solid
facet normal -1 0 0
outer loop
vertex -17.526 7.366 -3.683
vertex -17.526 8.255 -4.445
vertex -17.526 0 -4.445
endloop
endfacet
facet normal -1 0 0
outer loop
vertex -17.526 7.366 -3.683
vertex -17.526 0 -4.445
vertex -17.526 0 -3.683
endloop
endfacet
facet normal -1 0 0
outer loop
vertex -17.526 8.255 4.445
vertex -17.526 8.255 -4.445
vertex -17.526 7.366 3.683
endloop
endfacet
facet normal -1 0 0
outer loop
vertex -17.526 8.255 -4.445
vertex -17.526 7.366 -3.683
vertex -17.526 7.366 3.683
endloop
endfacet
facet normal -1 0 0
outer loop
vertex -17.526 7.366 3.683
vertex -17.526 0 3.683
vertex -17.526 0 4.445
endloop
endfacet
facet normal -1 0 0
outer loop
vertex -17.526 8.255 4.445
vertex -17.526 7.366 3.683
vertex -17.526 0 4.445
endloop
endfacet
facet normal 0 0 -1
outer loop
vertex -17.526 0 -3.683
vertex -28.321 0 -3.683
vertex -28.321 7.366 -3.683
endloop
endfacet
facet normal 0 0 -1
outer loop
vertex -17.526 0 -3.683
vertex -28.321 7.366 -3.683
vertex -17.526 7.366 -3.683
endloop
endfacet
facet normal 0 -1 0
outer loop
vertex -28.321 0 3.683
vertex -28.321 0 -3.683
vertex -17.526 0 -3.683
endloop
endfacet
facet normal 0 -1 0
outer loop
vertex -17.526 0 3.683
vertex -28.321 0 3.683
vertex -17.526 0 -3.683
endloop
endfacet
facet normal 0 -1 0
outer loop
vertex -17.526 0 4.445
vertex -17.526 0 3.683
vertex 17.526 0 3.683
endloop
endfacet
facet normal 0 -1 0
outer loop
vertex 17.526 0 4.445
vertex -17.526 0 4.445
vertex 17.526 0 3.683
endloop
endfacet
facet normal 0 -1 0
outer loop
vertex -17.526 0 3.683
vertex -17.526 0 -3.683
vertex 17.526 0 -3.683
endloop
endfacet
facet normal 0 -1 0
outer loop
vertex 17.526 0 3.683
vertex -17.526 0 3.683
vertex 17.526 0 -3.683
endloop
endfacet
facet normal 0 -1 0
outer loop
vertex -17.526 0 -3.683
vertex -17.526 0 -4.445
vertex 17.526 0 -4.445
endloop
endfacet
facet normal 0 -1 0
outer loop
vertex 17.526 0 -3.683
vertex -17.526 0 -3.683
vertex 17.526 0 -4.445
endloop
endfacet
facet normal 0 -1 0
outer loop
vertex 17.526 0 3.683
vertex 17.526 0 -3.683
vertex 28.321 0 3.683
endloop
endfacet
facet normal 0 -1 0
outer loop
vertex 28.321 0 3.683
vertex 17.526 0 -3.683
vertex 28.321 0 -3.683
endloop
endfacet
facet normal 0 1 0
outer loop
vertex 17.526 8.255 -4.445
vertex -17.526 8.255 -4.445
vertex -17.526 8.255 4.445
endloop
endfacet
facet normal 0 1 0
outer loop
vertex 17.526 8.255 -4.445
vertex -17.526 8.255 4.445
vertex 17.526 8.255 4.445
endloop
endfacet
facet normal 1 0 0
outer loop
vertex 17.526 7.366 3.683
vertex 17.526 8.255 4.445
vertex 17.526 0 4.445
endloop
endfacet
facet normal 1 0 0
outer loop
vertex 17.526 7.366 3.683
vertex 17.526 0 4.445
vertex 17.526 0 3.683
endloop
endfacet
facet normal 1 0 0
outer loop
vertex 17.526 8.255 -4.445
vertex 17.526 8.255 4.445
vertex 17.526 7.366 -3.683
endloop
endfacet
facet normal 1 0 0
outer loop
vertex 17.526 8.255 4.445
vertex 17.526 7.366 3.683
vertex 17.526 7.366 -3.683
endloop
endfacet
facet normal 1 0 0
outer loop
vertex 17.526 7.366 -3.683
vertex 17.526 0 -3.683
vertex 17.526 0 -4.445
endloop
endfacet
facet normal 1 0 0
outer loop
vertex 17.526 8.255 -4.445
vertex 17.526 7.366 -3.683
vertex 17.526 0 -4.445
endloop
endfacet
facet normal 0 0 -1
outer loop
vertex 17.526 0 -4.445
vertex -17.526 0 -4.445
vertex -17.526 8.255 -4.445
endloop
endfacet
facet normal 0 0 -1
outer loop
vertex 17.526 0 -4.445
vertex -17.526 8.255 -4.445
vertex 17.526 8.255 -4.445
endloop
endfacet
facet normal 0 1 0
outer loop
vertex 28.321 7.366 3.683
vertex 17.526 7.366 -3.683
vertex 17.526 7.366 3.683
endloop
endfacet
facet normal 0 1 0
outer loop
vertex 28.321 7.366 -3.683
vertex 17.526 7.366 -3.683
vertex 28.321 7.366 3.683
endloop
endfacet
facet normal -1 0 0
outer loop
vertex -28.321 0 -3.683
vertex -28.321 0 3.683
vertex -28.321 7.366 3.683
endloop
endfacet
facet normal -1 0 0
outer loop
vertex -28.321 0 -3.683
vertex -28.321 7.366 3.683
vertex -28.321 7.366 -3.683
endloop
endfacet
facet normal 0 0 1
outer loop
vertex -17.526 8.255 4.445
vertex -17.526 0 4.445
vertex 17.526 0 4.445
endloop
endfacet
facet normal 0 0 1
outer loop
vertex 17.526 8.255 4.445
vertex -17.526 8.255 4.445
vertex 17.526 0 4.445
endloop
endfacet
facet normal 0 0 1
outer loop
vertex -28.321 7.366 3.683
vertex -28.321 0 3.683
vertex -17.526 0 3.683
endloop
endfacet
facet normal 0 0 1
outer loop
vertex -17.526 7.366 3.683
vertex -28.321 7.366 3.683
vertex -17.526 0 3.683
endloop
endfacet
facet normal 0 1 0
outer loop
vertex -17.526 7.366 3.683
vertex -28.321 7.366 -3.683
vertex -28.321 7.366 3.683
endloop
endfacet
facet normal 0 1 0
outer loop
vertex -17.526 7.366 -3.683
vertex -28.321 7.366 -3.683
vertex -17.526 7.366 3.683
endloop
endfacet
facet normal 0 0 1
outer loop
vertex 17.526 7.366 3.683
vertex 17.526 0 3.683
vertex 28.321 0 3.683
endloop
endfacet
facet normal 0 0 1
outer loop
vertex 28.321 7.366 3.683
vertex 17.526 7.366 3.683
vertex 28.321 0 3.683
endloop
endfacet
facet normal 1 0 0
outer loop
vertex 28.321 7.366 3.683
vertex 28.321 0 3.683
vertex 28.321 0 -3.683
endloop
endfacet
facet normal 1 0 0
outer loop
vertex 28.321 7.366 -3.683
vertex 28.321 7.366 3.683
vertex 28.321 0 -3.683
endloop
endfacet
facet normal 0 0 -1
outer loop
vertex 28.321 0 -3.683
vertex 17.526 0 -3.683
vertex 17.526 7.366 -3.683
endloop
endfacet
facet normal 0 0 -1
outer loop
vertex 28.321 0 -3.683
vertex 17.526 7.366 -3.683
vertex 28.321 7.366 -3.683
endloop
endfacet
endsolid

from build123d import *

# Parameters (mm, degrees)
SKETCH2_W             = 10.795
SKETCH2_H             = 7.366
BOSS_EXTRUDE1_DEPTH   = 7.366
BOSS_EXTRUDE1_2_DEPTH = 7.366
SKETCH2_4_W           = 35.052
SKETCH2_4_H           = 8.89
BOSS_EXTRUDE2_DEPTH   = 8.255


with BuildPart() as part:
    # Sketch2 → Boss-Extrude1 (new body)
    with BuildSketch(Plane(origin=(0, 0, 0), x_dir=(1, 0, 0), z_dir=(0, 1, 0))):
        with Locations((-22.9235, 0)):
            Rectangle(SKETCH2_W, SKETCH2_H)
    extrude(amount=BOSS_EXTRUDE1_DEPTH)



with BuildPart() as body_2:
    # Sketch2 → Boss-Extrude1 2 (new body)
    with BuildSketch(Plane(origin=(0, 0, 0), x_dir=(1, 0, 0), z_dir=(0, 1, 0))):
        with Locations((22.9235, 0)):
            Rectangle(SKETCH2_W, SKETCH2_H)
    extrude(amount=BOSS_EXTRUDE1_2_DEPTH)


with BuildPart() as part_1:
    add(part.part)

    add(body_2.part)  # Boss-Extrude2 merges body 2
    # Sketch2<4> → Boss-Extrude2 (add)
    with BuildSketch(Plane(origin=(0, 0, 0), x_dir=(1, 0, 0), z_dir=(0, 1, 0))):
        Rectangle(SKETCH2_4_W, SKETCH2_4_H)
    extrude(amount=BOSS_EXTRUDE2_DEPTH)


solid = part_1.part
